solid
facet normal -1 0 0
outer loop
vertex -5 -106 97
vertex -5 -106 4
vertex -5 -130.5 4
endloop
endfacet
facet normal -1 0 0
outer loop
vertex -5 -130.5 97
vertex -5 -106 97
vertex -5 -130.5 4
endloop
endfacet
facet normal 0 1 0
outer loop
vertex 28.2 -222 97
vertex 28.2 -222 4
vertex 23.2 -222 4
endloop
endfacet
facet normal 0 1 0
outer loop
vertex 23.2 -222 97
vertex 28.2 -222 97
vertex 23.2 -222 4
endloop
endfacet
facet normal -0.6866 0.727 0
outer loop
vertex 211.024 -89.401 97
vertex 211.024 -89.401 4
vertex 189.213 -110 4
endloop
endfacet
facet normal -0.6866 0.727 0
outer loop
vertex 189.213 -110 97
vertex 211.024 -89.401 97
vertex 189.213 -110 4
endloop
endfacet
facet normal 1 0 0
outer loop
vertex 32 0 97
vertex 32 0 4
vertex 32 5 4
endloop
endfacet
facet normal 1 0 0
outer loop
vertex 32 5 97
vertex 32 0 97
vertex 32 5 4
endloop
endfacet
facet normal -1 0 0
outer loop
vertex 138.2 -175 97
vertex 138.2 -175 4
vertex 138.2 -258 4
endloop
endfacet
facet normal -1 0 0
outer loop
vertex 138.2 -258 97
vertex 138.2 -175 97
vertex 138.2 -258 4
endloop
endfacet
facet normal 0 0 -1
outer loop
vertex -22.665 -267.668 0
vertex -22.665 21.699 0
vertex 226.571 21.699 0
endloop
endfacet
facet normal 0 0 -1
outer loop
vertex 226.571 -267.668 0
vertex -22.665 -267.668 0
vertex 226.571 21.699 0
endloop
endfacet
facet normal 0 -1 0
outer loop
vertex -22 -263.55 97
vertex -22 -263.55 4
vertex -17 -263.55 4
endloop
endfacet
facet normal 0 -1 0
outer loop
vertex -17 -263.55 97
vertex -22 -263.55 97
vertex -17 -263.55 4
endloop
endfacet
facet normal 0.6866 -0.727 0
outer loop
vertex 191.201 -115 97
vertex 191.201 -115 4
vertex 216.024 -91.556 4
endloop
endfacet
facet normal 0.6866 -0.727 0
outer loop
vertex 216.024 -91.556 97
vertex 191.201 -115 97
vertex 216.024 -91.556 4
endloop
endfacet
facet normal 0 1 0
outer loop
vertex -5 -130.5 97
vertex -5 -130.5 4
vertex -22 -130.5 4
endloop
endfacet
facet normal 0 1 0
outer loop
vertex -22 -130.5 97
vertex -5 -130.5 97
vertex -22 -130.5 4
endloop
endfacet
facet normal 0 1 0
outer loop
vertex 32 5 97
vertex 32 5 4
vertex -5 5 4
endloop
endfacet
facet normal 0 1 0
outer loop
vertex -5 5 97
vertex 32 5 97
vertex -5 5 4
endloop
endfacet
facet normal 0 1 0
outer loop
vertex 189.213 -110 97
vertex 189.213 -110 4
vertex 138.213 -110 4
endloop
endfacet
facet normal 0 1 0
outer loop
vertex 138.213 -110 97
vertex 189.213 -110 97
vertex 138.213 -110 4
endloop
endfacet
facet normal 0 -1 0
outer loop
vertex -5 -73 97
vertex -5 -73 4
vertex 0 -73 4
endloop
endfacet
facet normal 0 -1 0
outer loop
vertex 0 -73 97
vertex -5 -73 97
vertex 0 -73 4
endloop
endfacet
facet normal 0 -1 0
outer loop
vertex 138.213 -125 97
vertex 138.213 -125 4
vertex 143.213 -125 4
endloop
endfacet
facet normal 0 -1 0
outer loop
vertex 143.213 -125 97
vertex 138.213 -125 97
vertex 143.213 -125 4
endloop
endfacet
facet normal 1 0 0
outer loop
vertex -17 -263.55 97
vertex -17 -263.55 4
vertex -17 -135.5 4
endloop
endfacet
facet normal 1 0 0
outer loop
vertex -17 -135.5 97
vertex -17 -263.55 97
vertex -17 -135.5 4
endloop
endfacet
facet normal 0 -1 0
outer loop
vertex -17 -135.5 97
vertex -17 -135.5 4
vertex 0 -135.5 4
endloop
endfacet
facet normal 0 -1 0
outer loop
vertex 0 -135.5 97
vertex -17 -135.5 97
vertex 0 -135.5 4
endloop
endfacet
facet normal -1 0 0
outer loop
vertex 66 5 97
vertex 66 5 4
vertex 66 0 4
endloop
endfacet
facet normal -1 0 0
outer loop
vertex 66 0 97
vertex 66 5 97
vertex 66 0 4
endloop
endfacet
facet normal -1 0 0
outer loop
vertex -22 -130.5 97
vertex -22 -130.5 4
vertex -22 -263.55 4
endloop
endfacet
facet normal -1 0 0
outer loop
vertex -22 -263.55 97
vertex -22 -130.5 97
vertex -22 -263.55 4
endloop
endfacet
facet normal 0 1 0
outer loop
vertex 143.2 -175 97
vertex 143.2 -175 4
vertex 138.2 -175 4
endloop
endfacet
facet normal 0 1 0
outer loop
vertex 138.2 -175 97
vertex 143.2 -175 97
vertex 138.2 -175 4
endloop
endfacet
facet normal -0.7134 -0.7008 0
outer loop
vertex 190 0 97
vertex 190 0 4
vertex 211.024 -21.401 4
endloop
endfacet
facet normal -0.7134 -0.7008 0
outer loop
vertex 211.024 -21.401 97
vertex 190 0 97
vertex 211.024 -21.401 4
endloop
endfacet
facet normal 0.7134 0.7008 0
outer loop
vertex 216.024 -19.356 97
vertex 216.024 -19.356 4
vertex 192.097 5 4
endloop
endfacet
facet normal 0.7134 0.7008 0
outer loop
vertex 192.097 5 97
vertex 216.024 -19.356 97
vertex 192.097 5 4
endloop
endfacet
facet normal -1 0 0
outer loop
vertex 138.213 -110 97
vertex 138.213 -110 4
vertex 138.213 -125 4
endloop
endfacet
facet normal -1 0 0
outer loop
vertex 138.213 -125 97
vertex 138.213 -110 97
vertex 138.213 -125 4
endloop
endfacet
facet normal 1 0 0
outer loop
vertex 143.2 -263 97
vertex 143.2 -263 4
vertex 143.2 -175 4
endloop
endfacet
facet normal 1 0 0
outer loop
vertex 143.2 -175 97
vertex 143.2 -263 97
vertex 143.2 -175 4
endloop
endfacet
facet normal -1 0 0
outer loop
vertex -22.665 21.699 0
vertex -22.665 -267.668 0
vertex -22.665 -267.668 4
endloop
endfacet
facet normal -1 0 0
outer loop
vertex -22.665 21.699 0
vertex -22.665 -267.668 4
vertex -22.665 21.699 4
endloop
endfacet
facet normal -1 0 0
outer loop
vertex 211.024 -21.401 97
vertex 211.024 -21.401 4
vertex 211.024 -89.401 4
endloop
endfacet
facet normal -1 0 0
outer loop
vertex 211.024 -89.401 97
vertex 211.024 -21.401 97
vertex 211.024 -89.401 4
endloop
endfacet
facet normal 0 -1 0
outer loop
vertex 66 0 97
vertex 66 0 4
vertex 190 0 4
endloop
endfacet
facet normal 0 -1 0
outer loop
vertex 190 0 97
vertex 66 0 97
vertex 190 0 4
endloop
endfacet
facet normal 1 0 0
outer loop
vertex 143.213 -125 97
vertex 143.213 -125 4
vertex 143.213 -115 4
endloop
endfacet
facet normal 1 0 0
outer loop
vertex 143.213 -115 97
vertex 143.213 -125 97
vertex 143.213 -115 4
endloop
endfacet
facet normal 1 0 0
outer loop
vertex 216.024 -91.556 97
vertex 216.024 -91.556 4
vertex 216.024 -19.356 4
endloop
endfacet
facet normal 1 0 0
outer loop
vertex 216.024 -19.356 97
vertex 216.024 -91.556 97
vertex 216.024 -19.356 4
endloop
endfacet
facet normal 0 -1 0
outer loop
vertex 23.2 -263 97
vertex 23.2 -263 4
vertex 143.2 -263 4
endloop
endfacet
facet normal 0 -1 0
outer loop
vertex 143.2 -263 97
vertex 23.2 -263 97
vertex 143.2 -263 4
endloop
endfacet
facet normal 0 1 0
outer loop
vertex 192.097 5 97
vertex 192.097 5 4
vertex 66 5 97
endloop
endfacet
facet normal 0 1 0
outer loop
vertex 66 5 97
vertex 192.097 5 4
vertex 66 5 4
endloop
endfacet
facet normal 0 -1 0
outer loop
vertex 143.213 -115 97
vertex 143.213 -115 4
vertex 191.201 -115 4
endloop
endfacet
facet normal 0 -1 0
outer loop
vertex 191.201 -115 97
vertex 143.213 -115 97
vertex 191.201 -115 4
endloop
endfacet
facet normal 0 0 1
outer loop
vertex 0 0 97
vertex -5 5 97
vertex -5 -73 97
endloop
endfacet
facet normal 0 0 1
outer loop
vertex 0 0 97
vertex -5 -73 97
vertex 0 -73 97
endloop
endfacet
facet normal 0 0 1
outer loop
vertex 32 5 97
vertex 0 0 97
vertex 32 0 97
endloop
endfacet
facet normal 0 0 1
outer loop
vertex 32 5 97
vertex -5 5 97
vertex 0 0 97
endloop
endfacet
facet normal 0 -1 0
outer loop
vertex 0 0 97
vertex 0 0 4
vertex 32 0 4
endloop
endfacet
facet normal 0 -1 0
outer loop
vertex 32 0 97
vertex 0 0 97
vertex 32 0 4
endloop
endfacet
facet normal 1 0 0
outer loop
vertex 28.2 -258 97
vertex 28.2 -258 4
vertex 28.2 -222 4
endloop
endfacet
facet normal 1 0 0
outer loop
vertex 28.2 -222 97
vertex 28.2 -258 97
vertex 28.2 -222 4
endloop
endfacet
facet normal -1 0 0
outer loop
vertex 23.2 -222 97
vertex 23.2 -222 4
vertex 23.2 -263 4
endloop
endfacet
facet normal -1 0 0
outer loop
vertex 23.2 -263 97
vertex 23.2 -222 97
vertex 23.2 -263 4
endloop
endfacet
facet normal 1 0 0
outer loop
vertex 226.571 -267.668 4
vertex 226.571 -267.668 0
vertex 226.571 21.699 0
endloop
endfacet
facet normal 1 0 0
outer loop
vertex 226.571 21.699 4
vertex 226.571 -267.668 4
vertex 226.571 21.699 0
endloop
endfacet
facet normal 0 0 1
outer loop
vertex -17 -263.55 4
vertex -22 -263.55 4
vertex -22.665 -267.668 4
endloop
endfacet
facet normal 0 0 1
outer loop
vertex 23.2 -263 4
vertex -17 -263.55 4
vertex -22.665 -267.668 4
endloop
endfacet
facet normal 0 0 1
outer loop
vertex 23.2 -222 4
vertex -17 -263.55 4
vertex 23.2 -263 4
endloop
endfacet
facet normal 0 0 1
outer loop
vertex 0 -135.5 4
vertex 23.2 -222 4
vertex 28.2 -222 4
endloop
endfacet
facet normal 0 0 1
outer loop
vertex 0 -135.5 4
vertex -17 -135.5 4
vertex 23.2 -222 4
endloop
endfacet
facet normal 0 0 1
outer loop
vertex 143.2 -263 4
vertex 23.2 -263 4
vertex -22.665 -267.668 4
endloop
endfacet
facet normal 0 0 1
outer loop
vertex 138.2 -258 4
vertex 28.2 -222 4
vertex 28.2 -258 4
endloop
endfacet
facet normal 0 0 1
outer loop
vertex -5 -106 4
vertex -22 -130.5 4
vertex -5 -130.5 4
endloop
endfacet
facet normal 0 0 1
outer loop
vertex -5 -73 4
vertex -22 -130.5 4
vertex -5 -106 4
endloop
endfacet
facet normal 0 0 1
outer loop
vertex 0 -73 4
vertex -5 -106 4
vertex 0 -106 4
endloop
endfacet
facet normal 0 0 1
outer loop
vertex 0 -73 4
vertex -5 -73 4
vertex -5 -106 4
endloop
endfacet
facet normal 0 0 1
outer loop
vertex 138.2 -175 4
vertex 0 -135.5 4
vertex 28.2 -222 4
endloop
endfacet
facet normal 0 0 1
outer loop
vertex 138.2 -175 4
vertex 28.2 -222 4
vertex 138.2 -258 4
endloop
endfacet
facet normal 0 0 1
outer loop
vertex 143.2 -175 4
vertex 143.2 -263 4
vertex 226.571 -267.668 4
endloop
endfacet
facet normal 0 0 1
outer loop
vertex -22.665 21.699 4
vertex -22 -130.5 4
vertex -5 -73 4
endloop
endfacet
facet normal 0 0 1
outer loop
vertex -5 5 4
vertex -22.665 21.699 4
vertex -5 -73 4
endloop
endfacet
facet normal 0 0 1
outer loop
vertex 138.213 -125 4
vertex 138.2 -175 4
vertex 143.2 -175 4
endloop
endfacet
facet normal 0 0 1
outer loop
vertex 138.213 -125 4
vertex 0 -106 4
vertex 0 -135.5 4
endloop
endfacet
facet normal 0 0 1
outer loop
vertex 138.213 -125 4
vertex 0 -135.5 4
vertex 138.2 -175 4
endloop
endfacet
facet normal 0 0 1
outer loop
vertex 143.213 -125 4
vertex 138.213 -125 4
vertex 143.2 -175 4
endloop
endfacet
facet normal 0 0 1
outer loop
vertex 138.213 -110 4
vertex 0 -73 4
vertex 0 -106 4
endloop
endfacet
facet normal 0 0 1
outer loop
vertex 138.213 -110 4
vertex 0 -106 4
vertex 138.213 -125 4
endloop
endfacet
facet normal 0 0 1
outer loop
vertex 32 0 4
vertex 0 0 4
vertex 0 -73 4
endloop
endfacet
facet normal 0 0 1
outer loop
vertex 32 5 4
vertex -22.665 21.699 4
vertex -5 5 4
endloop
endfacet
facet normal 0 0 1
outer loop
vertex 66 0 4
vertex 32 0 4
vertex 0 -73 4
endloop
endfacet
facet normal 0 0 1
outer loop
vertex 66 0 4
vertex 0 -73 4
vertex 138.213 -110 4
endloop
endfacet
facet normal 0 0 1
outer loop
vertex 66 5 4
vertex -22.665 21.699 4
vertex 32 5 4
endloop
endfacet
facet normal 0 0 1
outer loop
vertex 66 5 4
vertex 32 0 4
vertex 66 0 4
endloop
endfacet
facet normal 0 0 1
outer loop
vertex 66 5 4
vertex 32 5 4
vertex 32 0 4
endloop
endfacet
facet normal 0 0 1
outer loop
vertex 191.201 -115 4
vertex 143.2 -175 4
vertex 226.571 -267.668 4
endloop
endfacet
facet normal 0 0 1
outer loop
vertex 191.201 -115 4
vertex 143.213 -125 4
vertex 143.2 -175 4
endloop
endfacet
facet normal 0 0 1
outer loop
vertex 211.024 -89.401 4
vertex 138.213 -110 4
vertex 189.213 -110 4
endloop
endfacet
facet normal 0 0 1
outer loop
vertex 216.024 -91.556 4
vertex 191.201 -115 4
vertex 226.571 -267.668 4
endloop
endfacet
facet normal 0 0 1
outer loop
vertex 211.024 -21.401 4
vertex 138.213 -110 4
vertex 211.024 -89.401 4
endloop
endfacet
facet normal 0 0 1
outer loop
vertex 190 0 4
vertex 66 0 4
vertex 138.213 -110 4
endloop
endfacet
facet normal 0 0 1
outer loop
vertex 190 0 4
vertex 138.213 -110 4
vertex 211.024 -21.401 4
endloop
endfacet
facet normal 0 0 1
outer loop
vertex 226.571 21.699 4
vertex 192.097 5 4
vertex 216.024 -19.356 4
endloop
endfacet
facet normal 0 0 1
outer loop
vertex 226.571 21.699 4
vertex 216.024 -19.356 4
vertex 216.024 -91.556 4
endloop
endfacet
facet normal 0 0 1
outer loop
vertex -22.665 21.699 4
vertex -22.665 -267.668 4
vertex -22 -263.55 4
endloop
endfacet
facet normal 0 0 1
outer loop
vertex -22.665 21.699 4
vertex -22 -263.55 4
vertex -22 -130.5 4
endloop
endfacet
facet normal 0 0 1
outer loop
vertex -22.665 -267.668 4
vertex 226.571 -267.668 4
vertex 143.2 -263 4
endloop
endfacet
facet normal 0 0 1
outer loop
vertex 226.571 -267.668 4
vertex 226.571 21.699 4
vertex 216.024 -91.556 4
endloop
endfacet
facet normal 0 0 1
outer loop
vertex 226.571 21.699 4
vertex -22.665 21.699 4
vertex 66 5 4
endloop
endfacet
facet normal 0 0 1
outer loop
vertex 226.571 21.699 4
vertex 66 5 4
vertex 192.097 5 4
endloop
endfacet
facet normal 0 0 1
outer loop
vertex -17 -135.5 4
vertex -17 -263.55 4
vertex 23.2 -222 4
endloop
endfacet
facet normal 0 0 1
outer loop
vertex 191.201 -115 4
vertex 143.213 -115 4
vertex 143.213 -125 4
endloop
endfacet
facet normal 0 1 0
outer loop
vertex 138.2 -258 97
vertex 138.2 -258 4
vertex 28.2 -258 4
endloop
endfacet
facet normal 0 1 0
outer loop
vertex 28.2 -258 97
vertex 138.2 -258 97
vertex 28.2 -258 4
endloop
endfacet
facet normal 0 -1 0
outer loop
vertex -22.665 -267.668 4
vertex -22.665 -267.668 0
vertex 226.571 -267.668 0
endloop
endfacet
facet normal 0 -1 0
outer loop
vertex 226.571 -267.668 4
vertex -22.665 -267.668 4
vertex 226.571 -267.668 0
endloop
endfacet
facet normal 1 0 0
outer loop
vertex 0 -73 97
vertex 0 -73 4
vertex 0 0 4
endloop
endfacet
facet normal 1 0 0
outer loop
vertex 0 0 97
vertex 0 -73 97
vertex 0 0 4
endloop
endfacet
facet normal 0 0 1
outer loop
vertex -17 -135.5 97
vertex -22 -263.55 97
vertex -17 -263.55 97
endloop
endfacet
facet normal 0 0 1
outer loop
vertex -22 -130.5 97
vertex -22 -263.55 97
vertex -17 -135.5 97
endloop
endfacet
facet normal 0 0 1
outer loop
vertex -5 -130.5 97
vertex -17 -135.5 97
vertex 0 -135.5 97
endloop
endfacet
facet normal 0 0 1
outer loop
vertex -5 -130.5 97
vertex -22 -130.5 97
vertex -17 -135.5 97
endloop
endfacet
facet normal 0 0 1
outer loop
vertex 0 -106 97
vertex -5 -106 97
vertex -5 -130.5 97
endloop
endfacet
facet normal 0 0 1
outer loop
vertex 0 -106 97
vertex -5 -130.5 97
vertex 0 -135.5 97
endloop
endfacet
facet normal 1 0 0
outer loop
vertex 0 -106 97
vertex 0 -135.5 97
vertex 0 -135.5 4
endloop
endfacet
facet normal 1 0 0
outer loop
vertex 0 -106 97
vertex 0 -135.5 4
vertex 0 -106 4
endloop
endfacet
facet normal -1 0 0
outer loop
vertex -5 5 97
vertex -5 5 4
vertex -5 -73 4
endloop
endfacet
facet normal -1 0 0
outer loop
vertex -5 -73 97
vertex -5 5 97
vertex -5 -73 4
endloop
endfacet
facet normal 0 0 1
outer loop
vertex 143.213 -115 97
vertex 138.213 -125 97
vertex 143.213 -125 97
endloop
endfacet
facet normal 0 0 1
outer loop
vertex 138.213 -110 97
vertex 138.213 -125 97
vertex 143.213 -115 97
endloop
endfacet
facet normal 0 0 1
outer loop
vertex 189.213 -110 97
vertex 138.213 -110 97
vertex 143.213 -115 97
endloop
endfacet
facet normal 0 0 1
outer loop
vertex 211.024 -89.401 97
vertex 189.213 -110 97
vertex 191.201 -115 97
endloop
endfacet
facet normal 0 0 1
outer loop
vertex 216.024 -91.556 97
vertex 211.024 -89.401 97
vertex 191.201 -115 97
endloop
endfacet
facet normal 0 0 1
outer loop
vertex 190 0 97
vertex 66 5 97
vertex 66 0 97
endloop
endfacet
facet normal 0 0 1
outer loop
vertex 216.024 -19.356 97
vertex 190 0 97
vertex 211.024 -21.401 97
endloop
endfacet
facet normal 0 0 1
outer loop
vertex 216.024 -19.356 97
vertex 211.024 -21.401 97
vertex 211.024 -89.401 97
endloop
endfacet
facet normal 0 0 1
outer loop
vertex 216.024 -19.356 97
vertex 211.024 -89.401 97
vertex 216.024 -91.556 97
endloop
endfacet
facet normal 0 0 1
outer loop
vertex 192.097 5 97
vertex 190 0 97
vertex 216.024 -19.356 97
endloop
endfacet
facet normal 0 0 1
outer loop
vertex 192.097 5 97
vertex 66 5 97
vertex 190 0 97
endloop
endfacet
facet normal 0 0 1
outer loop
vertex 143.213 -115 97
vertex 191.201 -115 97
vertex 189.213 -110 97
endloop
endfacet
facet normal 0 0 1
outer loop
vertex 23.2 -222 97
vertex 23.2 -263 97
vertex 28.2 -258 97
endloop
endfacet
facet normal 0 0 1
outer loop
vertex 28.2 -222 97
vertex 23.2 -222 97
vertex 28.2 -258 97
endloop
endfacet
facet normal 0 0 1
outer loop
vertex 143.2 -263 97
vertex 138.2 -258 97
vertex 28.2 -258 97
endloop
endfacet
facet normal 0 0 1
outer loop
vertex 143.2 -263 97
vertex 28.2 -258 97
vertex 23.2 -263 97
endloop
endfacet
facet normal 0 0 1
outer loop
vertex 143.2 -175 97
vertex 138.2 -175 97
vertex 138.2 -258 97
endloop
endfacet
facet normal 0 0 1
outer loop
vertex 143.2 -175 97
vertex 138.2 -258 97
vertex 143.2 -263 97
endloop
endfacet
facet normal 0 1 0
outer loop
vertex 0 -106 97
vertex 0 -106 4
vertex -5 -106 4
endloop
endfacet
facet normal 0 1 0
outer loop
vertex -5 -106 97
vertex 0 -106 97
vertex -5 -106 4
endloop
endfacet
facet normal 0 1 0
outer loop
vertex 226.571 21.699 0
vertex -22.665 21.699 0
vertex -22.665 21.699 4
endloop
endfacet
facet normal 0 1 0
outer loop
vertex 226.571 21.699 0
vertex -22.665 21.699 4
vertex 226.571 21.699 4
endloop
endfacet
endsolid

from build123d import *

# Parameters (mm, degrees)
SKETCH001_W  = 249.235731
SKETCH001_H  = 289.366922
PAD_DEPTH    = 4
PAD001_DEPTH = 93


with BuildPart() as part:
    # Sketch001 → Pad (new body)
    with BuildSketch(Plane.XY):
        with Locations((101.953362, -122.984355)):
            Rectangle(SKETCH001_W, SKETCH001_H)
    extrude(amount=PAD_DEPTH)

    # Sketch (on Face6 of Pad) → Pad001 (join)
    with BuildSketch(Plane.XY.offset(4)):
        Polygon((-17, -135.5), (0, -135.5), (0, -106), (-5, -106), (-5, -130.5), (-22, -130.5), (-22, -263.55), (-17, -263.55), align=None)
        Polygon((0, 0), (32, 0), (32, 5), (-5, 5), (-5, -73), (0, -73), align=None)
        Polygon((66, 5), (66, 0), (190, 0), (211.023543, -21.401183), (211.023543, -89.401183), (189.213253, -110), (138.213253, -110), (138.213253, -125), (143.213253, -125), (143.213253, -115), (191.201161, -115), (216.023543, -91.5564), (216.023543, -19.356138), (192.097187, 5), align=None)
        Polygon((138.2, -257.999998), (28.2, -257.999998), (28.2, -221.999998), (23.2, -221.999998), (23.2, -262.999998), (143.2, -262.999998), (143.2, -174.999998), (138.2, -174.999998), align=None)
    extrude(amount=PAD001_DEPTH)


solid = part.part
